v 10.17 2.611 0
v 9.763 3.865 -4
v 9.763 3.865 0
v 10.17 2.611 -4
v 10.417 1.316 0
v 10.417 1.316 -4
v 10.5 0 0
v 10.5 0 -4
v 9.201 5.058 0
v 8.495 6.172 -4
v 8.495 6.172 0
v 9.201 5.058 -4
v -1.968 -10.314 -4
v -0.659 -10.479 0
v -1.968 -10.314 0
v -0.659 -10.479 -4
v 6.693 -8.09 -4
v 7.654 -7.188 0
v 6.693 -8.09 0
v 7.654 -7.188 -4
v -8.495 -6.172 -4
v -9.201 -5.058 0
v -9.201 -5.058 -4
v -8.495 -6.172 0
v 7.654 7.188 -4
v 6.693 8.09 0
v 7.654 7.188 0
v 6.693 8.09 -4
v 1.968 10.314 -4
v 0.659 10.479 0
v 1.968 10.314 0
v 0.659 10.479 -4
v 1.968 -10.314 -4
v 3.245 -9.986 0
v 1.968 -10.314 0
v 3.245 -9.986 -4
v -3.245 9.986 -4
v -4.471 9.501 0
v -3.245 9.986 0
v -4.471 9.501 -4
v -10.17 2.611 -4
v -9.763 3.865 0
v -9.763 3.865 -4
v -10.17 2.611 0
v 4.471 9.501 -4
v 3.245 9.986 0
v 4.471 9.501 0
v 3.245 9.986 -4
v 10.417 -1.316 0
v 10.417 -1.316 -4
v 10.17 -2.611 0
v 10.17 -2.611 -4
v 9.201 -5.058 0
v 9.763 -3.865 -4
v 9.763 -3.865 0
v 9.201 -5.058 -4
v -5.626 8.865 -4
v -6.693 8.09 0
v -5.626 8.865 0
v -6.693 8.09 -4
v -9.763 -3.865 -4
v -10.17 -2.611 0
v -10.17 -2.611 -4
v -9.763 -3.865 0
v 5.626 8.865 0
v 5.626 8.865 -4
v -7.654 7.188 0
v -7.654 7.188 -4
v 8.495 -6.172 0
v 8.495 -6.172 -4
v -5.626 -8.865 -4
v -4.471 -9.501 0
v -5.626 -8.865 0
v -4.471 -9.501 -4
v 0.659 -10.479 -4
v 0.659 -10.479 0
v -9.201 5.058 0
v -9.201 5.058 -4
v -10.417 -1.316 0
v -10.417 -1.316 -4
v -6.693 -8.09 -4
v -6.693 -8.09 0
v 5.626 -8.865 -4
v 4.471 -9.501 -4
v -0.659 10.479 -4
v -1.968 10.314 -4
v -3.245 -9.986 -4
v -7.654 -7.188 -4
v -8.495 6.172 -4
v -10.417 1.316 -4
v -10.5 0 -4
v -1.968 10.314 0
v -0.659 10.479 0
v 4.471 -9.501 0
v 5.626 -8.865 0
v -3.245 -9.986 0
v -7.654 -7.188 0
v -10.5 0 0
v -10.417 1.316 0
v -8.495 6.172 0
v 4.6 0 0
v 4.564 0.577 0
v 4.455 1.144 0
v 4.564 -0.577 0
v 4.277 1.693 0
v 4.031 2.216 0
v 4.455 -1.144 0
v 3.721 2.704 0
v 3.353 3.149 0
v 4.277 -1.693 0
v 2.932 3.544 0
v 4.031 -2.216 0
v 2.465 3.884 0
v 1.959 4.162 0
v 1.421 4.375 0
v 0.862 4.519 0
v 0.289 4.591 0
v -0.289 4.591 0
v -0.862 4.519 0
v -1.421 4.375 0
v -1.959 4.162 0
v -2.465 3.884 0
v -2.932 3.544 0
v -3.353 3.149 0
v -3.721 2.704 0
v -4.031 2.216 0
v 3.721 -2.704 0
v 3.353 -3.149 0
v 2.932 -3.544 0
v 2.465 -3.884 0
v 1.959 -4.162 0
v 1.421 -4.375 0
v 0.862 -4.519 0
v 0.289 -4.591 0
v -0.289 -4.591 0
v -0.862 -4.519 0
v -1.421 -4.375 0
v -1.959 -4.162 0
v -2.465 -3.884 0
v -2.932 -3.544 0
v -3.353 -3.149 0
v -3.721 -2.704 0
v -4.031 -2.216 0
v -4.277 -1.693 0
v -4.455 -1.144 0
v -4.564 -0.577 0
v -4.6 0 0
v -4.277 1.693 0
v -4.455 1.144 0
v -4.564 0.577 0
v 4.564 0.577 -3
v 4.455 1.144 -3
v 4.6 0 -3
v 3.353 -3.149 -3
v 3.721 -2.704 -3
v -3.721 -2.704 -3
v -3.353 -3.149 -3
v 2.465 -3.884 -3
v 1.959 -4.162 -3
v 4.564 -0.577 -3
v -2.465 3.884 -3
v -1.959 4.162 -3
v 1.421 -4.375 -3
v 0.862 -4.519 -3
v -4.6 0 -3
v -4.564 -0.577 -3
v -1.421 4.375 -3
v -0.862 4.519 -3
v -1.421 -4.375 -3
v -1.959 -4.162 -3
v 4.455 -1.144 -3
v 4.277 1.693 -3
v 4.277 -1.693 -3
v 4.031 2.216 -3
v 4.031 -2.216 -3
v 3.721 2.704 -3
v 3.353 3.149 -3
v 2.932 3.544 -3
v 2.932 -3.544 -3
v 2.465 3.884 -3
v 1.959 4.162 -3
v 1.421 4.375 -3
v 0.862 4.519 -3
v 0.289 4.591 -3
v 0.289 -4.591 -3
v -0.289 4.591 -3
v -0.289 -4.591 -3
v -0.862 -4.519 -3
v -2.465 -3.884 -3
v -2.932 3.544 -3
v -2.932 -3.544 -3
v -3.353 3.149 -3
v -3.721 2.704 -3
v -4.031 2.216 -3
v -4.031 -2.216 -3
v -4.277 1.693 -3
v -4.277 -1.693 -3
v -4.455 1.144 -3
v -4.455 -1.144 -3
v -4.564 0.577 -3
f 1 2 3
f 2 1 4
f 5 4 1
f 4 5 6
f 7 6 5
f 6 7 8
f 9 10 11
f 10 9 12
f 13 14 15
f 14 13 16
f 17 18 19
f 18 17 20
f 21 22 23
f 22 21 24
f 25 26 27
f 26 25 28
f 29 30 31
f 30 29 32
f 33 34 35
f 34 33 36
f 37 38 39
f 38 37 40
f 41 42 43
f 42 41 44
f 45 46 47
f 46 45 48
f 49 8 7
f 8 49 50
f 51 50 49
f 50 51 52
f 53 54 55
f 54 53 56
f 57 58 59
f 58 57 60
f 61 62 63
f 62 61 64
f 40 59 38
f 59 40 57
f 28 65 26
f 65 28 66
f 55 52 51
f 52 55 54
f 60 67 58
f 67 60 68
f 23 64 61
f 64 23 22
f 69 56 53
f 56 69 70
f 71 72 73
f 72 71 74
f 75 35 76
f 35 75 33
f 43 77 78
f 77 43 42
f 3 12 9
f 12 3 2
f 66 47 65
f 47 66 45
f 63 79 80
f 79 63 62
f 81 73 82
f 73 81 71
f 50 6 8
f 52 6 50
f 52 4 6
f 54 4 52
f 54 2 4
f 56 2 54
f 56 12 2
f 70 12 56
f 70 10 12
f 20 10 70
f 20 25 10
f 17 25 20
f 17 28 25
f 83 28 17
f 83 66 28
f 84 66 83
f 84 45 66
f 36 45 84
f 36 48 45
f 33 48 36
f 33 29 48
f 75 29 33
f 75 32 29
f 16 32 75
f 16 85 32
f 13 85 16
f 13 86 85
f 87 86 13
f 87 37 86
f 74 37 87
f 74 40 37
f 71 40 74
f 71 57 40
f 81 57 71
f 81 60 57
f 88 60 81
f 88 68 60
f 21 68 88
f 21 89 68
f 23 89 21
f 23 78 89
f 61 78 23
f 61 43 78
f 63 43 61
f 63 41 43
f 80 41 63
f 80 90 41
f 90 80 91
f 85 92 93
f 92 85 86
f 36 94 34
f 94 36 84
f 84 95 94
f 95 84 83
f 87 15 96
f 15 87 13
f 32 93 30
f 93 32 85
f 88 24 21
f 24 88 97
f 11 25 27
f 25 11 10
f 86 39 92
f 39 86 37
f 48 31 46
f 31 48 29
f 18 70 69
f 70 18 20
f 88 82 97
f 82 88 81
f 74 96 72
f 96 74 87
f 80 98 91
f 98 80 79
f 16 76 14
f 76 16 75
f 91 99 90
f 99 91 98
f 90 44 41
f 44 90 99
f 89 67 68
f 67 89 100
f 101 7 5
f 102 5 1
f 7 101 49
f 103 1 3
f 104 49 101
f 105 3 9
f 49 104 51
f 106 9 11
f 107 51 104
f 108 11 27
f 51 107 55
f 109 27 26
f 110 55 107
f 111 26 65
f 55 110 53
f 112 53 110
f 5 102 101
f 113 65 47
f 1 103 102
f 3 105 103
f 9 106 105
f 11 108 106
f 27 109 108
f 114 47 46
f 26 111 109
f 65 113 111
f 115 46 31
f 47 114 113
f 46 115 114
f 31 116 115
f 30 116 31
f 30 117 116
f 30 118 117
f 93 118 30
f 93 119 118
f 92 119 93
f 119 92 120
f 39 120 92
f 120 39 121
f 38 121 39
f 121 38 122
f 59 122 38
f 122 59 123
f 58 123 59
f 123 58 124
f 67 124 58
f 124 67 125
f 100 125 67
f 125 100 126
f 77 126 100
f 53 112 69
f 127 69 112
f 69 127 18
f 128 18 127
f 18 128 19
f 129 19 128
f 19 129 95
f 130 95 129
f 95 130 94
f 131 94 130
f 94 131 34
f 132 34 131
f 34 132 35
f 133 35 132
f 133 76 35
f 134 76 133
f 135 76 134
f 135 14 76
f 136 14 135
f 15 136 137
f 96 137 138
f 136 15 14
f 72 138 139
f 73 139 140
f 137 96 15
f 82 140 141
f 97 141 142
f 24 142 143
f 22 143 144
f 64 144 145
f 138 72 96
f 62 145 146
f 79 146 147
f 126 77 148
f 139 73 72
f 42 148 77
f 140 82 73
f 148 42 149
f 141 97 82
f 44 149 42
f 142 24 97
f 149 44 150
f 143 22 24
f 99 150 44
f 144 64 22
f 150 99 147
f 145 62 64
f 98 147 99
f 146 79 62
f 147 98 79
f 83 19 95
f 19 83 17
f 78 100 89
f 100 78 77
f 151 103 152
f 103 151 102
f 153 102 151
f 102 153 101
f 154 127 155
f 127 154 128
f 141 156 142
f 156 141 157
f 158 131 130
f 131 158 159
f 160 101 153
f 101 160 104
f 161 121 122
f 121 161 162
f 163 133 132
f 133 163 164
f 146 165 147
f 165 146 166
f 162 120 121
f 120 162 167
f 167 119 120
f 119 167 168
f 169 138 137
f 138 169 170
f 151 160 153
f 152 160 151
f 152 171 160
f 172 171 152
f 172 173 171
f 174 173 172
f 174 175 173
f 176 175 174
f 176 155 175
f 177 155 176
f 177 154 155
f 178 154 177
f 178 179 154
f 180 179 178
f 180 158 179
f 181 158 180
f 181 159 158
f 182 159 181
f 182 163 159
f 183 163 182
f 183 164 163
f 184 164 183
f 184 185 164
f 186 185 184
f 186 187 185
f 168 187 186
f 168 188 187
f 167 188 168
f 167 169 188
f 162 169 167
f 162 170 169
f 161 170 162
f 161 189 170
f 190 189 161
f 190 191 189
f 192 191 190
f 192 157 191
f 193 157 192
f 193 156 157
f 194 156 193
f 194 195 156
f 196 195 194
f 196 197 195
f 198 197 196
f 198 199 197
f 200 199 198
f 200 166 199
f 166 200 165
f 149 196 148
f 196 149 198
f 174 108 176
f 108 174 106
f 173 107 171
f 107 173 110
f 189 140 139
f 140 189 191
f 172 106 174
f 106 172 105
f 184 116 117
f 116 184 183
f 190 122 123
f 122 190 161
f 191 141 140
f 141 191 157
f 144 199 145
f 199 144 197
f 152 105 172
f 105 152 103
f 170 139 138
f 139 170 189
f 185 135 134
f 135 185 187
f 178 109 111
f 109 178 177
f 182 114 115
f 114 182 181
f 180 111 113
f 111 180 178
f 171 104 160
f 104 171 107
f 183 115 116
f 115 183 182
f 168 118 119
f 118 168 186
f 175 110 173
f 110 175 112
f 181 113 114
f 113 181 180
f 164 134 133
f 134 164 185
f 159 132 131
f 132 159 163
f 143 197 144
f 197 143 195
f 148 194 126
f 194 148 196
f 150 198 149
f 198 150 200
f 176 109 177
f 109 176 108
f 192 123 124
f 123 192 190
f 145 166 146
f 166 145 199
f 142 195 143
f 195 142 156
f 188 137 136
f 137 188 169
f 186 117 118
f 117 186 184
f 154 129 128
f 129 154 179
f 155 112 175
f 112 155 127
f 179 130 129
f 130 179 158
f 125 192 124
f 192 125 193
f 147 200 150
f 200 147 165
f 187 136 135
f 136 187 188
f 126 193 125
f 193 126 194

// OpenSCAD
$fn = 50;


difference() {
	union() {
		translate(v = [0, 0, -4.0000000000]) {
			cylinder(h = 4, r = 10.5000000000);
		}
	}
	union() {
		#translate(v = [0, 0, -3.0000000000]) {
			cylinder(h = 3, r = 4.6000000000);
		}
	}
}
